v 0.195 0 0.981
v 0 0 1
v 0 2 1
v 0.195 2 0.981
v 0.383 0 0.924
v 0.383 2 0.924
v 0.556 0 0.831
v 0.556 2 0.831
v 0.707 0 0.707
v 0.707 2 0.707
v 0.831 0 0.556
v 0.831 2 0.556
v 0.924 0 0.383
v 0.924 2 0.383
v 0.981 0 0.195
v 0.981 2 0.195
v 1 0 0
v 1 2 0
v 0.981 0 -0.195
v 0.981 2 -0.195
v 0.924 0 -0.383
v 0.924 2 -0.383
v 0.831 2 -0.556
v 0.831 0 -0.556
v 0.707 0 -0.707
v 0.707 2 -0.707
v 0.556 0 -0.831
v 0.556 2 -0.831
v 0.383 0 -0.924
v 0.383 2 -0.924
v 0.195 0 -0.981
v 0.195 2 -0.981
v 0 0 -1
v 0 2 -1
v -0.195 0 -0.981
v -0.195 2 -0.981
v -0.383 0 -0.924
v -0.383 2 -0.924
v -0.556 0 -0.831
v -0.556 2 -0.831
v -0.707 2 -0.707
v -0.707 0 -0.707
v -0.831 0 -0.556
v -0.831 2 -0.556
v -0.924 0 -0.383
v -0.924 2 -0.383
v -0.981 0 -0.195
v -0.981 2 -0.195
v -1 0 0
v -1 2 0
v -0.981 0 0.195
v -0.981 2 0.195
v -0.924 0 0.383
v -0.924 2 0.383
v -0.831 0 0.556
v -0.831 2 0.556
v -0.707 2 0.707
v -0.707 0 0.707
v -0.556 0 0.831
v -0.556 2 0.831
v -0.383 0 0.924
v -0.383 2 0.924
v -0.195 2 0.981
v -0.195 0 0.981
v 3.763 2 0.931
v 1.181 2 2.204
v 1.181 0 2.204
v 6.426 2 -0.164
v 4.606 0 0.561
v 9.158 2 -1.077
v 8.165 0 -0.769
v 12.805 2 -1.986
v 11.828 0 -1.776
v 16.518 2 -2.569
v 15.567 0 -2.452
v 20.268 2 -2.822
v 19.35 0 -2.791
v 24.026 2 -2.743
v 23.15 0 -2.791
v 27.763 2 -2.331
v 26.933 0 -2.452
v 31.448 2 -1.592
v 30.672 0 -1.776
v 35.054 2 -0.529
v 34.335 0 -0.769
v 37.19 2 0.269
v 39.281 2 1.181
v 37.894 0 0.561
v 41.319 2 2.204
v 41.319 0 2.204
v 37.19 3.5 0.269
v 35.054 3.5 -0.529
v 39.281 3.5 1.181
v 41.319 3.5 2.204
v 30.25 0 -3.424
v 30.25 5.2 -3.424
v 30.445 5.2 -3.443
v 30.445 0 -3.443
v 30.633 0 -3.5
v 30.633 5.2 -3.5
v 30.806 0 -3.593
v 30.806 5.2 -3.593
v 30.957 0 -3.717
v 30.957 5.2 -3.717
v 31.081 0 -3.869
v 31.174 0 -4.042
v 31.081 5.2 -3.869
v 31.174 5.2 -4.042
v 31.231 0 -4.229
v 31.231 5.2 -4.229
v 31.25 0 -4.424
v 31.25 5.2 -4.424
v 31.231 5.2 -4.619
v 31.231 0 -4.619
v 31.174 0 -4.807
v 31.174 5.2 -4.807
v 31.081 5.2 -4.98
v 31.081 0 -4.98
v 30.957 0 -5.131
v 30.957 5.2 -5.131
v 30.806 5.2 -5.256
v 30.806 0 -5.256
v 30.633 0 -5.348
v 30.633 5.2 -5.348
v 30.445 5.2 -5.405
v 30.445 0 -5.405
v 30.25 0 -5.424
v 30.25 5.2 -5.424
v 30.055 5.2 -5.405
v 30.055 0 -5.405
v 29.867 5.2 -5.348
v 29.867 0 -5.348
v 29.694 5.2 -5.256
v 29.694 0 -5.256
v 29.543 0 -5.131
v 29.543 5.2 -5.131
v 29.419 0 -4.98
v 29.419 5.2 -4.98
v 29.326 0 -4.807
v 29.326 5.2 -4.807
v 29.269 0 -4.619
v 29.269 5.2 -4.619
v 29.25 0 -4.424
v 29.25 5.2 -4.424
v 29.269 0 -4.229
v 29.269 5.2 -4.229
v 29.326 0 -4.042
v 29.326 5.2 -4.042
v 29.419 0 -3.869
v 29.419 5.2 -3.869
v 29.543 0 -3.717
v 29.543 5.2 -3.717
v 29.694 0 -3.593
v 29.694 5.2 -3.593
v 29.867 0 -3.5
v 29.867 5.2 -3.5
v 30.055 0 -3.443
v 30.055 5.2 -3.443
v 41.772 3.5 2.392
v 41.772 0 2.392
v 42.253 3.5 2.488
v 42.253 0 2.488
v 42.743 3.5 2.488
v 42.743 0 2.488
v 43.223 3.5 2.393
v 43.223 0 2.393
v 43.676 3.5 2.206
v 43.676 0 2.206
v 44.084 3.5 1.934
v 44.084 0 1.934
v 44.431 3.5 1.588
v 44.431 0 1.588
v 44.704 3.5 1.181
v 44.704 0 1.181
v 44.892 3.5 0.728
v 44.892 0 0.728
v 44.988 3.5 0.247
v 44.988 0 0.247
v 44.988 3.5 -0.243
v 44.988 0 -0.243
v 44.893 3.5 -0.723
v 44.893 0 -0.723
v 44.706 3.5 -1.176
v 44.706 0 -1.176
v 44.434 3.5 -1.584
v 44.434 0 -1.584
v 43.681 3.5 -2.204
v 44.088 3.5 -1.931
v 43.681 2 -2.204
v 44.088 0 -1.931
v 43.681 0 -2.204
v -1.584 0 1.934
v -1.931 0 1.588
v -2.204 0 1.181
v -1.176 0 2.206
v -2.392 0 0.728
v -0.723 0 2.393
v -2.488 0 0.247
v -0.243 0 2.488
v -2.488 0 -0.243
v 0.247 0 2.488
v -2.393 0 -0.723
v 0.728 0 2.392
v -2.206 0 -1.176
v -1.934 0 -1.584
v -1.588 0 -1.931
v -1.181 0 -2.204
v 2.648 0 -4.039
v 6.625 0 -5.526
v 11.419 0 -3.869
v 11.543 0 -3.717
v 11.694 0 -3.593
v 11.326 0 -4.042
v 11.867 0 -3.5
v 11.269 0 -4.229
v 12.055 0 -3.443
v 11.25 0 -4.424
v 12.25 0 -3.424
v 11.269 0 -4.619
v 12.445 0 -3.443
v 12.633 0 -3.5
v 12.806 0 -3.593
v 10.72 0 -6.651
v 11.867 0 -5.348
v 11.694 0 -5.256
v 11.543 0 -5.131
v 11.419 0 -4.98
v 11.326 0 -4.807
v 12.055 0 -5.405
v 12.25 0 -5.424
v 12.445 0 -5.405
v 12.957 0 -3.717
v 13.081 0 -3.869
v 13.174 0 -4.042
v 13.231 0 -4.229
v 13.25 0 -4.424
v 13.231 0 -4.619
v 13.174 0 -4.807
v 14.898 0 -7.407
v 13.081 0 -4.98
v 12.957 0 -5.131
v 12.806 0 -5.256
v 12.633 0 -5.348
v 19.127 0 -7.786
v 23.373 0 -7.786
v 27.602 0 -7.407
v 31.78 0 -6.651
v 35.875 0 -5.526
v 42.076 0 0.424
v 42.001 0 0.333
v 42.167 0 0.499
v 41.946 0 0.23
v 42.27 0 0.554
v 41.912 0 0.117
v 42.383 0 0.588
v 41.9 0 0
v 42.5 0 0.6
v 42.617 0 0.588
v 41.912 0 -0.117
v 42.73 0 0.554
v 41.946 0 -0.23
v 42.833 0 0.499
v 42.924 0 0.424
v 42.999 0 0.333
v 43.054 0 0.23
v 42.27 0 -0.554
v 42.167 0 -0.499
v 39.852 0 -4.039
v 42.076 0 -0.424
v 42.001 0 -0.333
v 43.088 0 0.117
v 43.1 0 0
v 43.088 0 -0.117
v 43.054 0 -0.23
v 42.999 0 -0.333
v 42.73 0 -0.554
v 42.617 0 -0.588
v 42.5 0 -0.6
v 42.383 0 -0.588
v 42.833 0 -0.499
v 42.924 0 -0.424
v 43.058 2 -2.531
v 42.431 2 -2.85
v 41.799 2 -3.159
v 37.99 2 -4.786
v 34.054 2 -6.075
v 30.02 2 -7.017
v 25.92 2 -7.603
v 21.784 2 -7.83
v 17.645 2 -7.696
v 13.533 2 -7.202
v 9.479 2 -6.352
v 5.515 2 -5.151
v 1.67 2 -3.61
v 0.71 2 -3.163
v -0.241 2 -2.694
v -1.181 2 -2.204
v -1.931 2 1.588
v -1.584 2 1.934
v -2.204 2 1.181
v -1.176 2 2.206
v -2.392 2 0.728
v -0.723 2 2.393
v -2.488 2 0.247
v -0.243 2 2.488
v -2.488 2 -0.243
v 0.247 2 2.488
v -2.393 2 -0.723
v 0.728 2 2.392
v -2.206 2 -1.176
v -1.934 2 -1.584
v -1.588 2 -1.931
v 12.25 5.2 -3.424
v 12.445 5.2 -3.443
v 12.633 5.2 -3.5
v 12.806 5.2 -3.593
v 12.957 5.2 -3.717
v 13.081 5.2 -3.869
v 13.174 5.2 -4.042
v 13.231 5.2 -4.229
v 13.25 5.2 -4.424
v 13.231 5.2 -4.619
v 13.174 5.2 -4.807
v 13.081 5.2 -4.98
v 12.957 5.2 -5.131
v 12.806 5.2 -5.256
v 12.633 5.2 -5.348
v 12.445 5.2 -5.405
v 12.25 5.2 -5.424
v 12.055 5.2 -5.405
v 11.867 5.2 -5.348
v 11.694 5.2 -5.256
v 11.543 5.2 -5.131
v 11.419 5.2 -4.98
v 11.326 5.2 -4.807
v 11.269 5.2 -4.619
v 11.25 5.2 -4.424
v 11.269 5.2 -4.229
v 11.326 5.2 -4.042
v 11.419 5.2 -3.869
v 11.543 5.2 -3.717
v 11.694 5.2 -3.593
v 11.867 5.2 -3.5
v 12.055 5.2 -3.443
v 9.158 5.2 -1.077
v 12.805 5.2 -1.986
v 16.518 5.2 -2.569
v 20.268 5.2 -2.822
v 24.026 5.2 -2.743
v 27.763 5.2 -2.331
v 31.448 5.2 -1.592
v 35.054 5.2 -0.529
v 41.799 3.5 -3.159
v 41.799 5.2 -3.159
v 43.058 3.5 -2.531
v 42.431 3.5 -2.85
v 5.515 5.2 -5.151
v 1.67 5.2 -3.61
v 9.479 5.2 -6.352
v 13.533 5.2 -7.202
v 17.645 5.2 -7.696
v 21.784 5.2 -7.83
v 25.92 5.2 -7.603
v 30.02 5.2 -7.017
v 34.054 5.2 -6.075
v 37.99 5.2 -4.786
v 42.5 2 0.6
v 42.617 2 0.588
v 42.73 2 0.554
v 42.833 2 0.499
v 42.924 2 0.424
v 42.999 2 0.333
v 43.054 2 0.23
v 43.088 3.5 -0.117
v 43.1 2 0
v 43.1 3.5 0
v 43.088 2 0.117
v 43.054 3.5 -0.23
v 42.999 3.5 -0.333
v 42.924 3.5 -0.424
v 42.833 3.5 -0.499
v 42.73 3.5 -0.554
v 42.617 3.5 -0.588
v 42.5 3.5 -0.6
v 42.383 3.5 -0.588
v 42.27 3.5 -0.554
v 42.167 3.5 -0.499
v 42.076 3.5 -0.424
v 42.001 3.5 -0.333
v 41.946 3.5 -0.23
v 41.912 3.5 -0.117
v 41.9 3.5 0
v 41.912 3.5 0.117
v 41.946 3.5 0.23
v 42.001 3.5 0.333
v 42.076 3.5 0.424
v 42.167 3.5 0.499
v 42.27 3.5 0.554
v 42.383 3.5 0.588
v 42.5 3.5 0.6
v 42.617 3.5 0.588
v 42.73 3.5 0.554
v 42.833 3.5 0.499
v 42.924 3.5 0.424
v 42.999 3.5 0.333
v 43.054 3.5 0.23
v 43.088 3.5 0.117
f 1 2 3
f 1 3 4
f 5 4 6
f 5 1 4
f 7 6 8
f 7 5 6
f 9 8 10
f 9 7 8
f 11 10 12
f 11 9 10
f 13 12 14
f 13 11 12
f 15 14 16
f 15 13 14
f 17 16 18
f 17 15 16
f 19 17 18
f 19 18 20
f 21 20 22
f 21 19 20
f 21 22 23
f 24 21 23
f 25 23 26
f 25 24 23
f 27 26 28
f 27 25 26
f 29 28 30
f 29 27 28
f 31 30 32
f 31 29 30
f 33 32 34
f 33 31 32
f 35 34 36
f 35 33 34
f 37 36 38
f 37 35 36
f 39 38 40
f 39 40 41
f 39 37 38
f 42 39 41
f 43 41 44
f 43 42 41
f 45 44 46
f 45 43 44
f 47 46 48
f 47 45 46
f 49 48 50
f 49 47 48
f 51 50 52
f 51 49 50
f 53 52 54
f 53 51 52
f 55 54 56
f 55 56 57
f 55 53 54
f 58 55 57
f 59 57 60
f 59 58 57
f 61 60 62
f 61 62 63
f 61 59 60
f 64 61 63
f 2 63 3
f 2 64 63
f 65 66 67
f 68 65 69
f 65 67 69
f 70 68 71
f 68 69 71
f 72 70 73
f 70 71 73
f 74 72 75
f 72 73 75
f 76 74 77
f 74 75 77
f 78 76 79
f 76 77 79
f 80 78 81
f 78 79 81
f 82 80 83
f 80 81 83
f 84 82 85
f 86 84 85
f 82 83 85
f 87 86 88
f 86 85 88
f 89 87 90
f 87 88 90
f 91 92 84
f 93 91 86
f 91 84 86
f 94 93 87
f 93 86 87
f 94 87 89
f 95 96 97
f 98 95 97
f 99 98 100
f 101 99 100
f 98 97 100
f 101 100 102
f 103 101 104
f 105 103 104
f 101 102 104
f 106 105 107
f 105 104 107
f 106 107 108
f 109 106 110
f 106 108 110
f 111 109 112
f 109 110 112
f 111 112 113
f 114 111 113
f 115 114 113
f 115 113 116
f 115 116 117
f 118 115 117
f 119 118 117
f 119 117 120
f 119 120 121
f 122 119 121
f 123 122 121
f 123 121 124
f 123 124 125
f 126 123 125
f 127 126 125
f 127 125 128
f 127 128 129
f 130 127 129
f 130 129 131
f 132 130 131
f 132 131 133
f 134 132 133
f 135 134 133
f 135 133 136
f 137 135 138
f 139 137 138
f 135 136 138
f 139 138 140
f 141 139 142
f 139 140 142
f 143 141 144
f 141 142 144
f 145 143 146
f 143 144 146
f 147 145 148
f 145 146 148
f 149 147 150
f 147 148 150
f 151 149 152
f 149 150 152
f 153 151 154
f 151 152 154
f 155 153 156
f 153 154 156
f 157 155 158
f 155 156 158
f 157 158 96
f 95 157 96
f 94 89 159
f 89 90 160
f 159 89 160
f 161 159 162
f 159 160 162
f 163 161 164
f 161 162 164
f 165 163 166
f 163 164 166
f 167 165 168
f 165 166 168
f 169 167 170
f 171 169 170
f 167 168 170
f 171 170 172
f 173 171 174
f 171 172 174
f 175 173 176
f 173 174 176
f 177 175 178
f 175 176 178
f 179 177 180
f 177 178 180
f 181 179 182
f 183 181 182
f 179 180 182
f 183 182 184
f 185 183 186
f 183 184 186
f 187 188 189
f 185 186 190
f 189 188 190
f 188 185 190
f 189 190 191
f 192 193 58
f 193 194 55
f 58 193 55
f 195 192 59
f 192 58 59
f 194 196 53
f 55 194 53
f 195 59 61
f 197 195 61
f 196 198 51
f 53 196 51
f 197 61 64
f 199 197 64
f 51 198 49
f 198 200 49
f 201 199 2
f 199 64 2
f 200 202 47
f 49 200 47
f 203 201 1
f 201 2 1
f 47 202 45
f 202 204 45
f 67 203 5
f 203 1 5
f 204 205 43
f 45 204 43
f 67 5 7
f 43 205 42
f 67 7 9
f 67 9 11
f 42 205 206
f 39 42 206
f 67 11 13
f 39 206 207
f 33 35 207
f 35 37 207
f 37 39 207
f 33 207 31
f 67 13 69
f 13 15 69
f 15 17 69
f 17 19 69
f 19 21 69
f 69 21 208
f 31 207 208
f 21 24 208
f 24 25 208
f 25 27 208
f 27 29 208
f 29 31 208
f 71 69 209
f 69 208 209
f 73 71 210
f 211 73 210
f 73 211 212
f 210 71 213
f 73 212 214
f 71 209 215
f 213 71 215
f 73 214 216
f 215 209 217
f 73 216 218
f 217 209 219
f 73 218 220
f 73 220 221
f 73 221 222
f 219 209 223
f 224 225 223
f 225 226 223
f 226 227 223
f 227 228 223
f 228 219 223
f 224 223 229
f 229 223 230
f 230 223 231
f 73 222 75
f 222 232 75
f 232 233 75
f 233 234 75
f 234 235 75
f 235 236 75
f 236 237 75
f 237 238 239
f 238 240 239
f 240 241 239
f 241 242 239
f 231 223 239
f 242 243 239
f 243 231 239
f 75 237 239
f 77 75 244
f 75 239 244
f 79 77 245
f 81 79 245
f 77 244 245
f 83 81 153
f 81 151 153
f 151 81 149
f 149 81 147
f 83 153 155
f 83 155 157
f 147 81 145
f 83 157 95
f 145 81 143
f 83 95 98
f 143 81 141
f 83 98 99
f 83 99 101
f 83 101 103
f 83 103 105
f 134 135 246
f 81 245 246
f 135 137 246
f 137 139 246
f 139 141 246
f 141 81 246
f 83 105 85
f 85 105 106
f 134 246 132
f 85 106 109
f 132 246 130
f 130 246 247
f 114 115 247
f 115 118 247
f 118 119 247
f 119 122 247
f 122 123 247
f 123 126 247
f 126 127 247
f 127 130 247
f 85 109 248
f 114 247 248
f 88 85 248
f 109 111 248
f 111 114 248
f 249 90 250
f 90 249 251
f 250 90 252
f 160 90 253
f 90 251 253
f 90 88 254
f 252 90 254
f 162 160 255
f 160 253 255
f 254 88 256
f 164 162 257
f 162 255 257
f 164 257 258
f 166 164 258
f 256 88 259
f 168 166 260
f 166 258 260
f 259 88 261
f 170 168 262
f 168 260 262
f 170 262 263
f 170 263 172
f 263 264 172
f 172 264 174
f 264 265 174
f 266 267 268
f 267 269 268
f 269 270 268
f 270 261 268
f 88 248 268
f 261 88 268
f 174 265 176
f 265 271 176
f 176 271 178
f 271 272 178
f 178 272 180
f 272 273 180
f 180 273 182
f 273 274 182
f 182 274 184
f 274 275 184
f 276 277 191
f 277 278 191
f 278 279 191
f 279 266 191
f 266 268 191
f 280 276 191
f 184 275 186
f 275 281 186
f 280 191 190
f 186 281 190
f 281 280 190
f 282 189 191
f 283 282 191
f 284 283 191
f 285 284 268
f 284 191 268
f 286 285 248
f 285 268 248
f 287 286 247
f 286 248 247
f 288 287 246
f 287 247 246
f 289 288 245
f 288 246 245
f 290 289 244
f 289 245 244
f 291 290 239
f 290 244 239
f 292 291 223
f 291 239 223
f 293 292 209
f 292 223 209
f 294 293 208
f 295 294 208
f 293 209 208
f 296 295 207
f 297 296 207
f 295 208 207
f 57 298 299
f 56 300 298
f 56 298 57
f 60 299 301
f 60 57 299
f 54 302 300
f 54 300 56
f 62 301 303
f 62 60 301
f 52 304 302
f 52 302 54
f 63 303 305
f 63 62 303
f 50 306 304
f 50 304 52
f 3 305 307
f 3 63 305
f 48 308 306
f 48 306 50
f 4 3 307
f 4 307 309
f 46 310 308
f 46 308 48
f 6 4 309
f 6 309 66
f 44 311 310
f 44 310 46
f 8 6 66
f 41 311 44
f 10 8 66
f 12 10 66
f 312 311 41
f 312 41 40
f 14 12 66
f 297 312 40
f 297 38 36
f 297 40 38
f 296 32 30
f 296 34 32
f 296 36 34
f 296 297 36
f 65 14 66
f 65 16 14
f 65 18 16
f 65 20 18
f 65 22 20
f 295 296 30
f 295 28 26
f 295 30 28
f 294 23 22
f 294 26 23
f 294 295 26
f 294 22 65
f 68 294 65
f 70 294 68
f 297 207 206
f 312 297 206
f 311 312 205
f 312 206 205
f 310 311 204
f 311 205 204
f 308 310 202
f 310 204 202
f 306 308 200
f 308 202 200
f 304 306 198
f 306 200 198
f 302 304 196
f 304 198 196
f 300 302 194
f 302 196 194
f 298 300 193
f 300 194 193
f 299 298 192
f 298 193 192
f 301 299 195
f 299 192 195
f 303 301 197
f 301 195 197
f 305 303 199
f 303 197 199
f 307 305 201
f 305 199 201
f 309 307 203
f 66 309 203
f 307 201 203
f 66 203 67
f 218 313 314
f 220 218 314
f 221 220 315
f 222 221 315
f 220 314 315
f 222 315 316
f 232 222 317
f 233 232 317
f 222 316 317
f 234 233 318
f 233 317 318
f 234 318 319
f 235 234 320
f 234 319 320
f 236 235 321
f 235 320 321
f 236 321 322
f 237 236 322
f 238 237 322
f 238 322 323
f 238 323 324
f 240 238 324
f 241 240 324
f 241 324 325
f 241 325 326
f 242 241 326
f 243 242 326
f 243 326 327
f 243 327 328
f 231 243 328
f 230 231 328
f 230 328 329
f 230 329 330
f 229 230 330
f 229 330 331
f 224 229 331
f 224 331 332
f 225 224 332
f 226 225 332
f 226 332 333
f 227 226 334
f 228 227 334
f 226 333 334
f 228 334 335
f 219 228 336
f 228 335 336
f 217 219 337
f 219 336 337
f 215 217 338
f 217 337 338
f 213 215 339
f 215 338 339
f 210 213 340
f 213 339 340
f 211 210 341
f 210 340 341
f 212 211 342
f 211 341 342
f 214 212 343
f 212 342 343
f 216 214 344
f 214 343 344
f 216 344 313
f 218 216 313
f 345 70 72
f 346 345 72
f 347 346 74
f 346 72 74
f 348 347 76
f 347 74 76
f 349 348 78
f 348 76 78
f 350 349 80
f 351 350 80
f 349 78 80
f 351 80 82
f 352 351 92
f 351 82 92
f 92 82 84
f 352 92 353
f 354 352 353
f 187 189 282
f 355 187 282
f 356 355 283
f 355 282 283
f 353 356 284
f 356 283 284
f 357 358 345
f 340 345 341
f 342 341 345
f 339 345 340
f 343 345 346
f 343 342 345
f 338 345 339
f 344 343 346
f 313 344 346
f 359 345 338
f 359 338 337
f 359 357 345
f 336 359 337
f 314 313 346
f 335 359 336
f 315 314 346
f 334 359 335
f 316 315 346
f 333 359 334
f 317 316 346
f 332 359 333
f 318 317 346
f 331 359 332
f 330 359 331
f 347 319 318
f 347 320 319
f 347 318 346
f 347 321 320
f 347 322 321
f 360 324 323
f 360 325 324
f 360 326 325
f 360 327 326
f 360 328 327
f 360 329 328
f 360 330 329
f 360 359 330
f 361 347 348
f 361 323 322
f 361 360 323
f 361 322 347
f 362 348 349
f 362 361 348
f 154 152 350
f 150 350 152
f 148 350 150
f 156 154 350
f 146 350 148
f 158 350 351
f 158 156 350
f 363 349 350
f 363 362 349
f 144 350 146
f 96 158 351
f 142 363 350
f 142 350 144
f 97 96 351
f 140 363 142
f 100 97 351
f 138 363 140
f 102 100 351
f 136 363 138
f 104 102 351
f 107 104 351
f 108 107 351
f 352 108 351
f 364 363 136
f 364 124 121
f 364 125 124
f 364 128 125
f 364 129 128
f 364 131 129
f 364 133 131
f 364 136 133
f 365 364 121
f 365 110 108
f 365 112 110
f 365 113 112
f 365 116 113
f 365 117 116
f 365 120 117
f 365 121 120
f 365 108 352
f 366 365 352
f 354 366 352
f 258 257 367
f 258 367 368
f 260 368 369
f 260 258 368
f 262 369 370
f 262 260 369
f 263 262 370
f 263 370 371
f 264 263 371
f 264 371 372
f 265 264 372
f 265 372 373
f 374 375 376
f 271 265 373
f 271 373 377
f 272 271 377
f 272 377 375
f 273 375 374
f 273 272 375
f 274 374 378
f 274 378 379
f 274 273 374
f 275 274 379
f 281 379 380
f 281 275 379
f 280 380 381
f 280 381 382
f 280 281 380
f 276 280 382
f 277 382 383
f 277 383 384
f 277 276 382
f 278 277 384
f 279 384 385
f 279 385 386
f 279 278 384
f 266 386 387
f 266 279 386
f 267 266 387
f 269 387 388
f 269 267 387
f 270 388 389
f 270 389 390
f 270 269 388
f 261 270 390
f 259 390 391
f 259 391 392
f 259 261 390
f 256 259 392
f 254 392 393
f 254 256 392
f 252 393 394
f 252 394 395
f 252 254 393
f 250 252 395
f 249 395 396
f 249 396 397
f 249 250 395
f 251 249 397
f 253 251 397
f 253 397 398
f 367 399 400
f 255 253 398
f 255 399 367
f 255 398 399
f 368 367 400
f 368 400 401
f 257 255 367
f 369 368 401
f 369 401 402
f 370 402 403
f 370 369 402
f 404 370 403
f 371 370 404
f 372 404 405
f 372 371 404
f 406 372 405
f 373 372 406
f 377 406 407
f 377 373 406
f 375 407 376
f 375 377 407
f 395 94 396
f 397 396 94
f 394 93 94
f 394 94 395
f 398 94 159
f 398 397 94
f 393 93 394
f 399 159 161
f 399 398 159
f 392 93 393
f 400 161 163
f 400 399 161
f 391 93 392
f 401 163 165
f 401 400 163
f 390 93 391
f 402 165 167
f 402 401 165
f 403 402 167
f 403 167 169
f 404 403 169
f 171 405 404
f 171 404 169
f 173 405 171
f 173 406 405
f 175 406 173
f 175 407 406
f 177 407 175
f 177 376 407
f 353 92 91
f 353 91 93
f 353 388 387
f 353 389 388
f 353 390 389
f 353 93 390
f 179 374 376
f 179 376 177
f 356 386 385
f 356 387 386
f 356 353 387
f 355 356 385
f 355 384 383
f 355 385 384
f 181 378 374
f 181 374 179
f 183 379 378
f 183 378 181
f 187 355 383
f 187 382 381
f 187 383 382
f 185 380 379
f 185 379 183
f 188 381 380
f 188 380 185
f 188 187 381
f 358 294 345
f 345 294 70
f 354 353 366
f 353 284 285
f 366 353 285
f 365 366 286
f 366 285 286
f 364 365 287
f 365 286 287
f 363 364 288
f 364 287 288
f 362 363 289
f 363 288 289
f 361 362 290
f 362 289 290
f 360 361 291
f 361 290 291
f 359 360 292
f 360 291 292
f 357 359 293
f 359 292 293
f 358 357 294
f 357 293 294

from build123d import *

# Parameters (mm, degrees)
SKETCH2_R           = 1
SKETCH2_R_2         = 0.6
BOSS_EXTRUDE2_DEPTH = 2
BOSS_EXTRUDE3_DEPTH = 3.2
SKETCH4_R           = 0.6
BOSS_EXTRUDE4_DEPTH = 1.5
SKETCH5_R           = 1
CUT_EXTRUDE1_DEPTH  = 46.971757444


with BuildPart() as part:
    # Sketch2 → Boss-Extrude2 (new body)
    with BuildSketch(Plane(origin=(0, 0, 0), x_dir=(1, 0, 0), z_dir=(0, 1, 0))):
        with BuildLine():
            ThreePointArc((43.680555556, 2.203698841), (21.25, 7.833420868), (-1.180555556, 2.203698841))
            ThreePointArc((-1.180555556, 2.203698841), (-2.203698841, -1.180555556), (1.180555556, -2.203698841))
            ThreePointArc((1.180555556, -2.203698841), (21.25, 2.833420868), (41.319444444, -2.203698841))
            ThreePointArc((41.319444444, -2.203698841), (44.703698841, -1.180555556), (43.680555556, 2.203698841))
        make_face()
        Circle(SKETCH2_R, mode=Mode.SUBTRACT)
        with Locations((42.5, 0)):
            Circle(SKETCH2_R_2, mode=Mode.SUBTRACT)
    extrude(amount=BOSS_EXTRUDE2_DEPTH)

    # Sketch3 → Boss-Extrude3 (add)
    with BuildSketch(Plane(origin=(0, 2, 0), x_dir=(1, 0, 0), z_dir=(0, 1, 0))):
        with BuildLine():
            ThreePointArc((41.798567685, 3.158721406), (21.784485497, 7.830413671), (1.670343314, 3.610285866))
            Line((1.670343314, 3.610285866), (9.157651663, 1.076826613))
            ThreePointArc((9.157651663, 1.076826613), (22.148316133, 2.823926021), (35.053533161, 0.529346934))
            Line((35.053533161, 0.529346934), (41.798567685, 3.158721406))
        make_face()
    extrude(amount=BOSS_EXTRUDE3_DEPTH)

    # Sketch4 → Boss-Extrude4 (add)
    with BuildSketch(Plane(origin=(0, 2, 0), x_dir=(1, 0, 0), z_dir=(0, 1, 0))):
        with BuildLine():
            ThreePointArc((43.680555556, 2.203698841), (42.744866263, 2.691663565), (41.798567685, 3.158721406))
            Line((41.798567685, 3.158721406), (35.053533161, 0.529346934))
            ThreePointArc((35.053533161, 0.529346934), (38.241528412, -0.710989517), (41.319444444, -2.203698841))
            ThreePointArc((41.319444444, -2.203698841), (44.703698841, -1.180555556), (43.680555556, 2.203698841))
        make_face()
        with Locations((42.5, 0)):
            Circle(SKETCH4_R, mode=Mode.SUBTRACT)
    extrude(amount=BOSS_EXTRUDE4_DEPTH)

    # Sketch5 → Cut-Extrude1 (cut, through all)
    with BuildSketch(Plane(origin=(0, 5.2, 0), x_dir=(1, 0, 0), z_dir=(0, 1, 0))):
        with Locations((12.25, 4.424236239)):
            Circle(SKETCH5_R)
        with Locations((30.25, 4.424236239)):
            Circle(SKETCH5_R)
    extrude(amount=-CUT_EXTRUDE1_DEPTH, mode=Mode.SUBTRACT)


solid = part.part
